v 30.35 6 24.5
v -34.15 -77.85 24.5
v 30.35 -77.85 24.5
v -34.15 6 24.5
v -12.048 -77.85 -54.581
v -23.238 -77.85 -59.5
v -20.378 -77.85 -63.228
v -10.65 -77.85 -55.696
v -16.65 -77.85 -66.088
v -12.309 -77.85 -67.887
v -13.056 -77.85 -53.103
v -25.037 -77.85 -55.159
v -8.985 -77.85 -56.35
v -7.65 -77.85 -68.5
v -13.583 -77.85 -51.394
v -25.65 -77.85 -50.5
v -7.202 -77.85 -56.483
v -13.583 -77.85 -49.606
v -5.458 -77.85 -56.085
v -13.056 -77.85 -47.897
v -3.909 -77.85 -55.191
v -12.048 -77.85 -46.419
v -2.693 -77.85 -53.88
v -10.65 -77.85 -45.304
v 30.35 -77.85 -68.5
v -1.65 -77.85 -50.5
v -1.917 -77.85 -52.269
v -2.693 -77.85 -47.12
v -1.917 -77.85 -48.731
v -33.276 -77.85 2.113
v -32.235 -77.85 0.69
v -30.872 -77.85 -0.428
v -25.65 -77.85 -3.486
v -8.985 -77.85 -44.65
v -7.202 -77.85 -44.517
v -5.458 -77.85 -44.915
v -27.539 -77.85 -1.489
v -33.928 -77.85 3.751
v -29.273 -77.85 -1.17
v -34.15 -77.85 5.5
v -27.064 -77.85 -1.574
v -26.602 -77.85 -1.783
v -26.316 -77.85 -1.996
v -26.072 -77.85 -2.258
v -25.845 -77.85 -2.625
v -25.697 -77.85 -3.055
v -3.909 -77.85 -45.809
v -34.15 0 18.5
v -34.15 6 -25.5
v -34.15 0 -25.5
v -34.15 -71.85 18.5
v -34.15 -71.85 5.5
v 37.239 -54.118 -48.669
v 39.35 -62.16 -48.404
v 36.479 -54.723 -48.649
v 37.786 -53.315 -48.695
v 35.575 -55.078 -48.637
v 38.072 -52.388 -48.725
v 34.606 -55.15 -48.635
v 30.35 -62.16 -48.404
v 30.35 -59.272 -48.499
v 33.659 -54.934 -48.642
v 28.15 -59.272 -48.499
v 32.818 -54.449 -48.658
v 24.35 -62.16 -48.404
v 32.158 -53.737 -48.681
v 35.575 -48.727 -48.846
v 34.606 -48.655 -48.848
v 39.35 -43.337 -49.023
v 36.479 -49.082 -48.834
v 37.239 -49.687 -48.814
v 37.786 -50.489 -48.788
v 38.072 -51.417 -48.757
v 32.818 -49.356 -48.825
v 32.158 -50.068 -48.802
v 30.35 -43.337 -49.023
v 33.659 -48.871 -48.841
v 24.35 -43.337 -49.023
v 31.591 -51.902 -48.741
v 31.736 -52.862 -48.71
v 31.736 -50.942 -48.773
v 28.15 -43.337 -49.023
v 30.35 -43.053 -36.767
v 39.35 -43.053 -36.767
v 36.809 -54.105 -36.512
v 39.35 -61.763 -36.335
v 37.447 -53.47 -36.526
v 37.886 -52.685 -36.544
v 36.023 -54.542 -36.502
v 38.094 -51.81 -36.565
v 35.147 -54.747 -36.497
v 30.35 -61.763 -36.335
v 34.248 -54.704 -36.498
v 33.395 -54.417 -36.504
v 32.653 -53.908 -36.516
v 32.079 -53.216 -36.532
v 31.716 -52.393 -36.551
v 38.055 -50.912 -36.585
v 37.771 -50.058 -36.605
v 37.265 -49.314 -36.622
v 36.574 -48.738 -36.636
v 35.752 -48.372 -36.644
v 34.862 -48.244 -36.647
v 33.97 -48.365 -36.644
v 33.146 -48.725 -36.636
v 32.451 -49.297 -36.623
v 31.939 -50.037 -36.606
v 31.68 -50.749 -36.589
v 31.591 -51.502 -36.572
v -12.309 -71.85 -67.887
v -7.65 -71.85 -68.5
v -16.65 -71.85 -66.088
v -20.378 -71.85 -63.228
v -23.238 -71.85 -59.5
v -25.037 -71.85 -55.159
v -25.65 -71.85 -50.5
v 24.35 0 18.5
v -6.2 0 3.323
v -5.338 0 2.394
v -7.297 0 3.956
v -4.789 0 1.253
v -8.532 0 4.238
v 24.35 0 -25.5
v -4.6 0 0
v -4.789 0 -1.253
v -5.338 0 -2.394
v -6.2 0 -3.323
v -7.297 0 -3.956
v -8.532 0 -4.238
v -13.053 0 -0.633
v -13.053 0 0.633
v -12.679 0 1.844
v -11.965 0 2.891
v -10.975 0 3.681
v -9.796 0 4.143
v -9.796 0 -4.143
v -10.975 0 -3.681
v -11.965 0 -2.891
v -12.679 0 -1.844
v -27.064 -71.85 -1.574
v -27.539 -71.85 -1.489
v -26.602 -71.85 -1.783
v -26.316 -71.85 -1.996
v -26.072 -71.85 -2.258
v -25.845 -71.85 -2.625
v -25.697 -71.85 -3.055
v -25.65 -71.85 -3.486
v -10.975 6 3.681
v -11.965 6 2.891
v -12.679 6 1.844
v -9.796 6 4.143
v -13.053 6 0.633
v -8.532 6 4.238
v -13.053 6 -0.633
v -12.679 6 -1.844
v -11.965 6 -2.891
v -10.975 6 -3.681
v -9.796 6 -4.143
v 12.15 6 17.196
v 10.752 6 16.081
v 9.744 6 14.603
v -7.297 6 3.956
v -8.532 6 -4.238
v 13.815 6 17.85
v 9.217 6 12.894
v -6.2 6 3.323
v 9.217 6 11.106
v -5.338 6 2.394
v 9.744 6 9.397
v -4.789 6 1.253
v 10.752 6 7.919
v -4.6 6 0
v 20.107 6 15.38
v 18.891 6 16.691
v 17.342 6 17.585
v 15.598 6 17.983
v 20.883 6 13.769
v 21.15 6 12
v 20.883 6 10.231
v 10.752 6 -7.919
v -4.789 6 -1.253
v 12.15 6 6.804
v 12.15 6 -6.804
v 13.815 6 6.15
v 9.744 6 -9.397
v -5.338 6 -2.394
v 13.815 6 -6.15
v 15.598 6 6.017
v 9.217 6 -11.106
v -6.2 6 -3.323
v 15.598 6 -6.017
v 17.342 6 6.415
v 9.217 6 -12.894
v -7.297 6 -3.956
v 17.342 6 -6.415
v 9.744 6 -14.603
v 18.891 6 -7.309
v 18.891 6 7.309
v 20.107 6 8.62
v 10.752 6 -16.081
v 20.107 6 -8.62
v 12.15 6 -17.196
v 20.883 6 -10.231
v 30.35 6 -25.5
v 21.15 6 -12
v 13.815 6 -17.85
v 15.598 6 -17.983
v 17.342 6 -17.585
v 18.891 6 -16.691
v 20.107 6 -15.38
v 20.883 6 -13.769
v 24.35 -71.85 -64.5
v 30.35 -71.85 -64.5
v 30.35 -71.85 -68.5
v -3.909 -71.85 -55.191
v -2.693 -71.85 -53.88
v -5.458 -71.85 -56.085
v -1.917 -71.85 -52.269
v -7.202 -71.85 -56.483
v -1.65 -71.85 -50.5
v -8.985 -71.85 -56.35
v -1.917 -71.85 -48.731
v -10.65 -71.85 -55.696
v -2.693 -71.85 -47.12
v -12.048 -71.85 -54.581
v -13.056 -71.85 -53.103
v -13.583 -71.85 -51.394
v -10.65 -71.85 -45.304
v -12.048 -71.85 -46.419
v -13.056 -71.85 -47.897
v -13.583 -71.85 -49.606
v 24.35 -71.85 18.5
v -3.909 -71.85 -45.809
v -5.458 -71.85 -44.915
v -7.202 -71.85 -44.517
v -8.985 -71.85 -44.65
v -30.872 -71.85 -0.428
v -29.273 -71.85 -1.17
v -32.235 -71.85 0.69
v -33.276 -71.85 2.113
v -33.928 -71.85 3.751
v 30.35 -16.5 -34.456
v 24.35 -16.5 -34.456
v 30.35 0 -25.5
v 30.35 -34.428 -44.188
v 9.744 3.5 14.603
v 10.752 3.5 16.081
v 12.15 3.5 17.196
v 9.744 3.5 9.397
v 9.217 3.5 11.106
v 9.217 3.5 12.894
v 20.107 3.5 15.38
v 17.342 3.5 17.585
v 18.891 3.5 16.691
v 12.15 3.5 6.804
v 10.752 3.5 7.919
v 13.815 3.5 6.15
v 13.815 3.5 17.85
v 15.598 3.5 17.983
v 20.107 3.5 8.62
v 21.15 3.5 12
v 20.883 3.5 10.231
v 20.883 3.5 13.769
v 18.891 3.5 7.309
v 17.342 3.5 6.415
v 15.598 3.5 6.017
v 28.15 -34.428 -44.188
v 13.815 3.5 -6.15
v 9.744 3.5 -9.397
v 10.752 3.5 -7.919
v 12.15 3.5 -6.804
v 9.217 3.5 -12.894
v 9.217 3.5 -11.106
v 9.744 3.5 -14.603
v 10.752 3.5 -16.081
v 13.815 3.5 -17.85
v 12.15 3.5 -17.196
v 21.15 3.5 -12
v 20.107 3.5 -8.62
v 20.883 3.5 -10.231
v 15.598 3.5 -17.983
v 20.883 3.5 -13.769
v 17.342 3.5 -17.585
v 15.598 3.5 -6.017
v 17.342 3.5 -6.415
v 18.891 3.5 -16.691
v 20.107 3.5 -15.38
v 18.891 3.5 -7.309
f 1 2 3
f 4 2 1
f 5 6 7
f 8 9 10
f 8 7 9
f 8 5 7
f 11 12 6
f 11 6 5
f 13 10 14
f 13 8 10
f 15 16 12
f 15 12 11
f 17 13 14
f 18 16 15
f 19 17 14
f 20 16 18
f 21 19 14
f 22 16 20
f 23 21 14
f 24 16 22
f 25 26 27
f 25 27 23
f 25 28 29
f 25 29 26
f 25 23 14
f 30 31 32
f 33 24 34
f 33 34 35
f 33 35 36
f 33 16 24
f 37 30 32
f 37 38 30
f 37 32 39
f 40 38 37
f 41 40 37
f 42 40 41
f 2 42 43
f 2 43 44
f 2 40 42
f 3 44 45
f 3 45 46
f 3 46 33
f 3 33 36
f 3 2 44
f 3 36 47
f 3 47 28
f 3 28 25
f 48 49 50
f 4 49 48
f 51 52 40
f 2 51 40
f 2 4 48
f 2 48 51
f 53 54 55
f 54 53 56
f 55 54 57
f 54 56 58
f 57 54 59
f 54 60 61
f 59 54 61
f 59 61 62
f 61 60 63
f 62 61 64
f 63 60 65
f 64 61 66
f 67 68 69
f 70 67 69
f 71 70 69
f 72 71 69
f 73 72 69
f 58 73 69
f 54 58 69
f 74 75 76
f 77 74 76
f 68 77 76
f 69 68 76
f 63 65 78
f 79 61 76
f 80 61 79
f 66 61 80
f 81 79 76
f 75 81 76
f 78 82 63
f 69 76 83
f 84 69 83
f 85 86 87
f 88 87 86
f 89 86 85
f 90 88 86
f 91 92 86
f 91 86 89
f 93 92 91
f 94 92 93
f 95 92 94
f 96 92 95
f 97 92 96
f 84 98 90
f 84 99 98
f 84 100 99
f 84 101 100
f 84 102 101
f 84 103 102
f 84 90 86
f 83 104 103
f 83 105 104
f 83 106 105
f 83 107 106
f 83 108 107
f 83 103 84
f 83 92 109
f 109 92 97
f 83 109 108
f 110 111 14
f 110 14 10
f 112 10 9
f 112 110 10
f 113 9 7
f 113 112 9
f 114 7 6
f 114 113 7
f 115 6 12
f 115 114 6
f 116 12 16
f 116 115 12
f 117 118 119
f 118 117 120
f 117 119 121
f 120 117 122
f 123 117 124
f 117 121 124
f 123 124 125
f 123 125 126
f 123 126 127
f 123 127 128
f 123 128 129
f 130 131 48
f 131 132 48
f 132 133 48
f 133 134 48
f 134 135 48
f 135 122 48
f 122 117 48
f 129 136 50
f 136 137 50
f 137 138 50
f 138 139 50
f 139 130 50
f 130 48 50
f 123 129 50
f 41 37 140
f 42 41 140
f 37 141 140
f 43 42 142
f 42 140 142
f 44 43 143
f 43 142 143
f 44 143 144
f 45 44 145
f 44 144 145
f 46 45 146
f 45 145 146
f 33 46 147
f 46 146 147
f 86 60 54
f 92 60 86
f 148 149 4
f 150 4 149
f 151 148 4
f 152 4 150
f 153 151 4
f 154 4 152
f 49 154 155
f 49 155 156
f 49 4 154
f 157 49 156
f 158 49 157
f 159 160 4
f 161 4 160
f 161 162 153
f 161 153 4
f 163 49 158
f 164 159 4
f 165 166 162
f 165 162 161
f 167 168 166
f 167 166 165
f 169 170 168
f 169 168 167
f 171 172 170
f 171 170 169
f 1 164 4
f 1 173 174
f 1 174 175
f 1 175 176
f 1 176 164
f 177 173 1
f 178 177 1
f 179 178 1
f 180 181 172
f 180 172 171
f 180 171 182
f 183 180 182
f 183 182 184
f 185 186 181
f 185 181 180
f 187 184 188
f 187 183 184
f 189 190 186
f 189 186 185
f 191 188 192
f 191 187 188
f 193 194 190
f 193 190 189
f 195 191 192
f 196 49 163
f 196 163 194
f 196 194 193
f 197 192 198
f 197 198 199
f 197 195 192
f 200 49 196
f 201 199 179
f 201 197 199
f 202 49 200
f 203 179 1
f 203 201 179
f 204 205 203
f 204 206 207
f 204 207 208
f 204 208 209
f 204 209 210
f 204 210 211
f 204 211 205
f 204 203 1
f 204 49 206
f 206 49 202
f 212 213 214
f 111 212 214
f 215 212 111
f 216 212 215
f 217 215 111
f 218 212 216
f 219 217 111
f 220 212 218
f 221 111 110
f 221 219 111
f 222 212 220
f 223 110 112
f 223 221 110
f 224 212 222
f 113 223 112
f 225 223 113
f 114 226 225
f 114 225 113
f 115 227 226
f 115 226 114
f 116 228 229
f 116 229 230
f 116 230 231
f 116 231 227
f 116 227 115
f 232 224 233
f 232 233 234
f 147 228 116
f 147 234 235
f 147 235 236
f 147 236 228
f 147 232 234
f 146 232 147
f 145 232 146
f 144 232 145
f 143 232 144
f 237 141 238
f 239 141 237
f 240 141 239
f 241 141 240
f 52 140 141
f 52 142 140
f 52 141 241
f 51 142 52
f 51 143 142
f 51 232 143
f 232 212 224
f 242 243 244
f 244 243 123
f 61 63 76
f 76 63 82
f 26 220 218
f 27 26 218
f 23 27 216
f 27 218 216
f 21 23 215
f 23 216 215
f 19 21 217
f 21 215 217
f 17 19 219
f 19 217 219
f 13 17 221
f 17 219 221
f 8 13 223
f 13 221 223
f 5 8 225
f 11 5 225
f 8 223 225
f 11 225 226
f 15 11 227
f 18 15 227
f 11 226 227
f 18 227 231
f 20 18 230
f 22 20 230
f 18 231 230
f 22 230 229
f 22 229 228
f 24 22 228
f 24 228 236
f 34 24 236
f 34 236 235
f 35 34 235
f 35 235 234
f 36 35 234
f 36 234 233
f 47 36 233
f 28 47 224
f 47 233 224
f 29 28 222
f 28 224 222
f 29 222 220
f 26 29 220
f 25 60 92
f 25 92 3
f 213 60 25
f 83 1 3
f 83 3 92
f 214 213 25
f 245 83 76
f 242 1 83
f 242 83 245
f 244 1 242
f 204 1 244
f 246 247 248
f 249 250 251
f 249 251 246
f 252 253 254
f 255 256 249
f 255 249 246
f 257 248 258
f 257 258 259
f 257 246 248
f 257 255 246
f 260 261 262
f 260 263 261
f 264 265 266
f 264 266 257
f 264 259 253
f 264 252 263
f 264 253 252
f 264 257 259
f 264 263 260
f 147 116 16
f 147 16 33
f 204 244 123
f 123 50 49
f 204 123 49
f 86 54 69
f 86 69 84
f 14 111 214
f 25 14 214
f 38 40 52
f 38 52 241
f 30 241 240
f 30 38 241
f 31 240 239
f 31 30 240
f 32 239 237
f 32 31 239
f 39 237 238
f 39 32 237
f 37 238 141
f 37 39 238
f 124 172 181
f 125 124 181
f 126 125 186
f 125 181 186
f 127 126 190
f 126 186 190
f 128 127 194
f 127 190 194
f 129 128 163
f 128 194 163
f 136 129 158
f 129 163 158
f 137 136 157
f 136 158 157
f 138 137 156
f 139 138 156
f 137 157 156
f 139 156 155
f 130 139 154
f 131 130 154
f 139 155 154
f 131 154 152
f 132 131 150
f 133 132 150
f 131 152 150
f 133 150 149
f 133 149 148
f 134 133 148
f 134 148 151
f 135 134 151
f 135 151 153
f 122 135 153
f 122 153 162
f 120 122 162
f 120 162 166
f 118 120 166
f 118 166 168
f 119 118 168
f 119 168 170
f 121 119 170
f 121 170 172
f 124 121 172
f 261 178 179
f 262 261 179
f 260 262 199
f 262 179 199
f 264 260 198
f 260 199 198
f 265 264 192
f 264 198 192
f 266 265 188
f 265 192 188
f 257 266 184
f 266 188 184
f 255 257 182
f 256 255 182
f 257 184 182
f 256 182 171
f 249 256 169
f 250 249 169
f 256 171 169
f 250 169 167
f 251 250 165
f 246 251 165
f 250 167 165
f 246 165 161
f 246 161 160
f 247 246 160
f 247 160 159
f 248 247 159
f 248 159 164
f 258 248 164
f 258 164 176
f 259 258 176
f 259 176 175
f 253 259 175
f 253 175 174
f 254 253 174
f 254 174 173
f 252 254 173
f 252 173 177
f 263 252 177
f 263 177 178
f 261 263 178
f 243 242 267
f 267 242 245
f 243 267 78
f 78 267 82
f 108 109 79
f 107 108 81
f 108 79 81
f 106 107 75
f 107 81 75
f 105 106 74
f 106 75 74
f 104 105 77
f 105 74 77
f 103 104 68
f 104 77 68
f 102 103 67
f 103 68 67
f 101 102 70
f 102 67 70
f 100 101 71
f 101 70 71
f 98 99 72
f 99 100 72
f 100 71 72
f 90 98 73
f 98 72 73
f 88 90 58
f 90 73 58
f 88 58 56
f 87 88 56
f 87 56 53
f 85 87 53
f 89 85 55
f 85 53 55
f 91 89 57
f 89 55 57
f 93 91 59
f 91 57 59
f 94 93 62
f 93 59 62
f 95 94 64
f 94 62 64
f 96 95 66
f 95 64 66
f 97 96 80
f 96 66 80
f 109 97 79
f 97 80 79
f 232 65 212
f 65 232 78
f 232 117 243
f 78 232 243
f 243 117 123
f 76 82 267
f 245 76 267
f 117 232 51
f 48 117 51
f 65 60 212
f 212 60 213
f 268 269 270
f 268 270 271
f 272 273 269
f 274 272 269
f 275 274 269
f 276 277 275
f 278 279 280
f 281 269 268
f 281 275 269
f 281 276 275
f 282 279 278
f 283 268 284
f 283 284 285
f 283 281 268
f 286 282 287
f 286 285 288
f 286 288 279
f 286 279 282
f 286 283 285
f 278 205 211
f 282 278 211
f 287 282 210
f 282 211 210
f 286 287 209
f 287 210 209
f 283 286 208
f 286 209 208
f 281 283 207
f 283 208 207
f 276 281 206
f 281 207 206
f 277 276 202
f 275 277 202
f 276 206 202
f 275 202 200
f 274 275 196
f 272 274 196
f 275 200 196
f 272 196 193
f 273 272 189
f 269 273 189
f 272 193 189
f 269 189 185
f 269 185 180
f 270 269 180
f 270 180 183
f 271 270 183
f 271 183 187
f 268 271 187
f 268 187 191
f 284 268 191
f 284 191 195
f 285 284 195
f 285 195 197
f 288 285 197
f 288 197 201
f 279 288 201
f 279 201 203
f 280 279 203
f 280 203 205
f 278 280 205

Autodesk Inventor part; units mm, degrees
ref_plane "YZ Plane" through (0, 0, 0) normal (1, 0, 0) x (0, 1, 0)
ref_plane "XZ Plane" through (0, 0, 0) normal (0, 1, 0) x (-1, 0, 0)
ref_plane "XY Plane" through (0, 0, 0) normal (0, 0, 1) x (1, 0, 0)
sketch "Sketch1" plane through (0, 0, 0) normal (0, 1, 0) x (-1, 0, 0)
  line L0 (0, -25.5) -> (-34.15, -25.5)
  line L1 (-34.15, -25.5) -> (-34.15, 0)
  line L2 (-34.15, 0) -> (-34.15, 25.5)
  line L3 (-34.15, 25.5) -> (0, 25.5)
  line L4 (0, 25.5) -> (34.15, 25.5)
  line L5 (34.15, 25.5) -> (34.15, 0)
  line L6 (34.15, 0) -> (34.15, -25.5)
  line L7 (34.15, -25.5) -> (0, -25.5)
  point P0 (0, 0)
extrude "Extrusion1" add sketch "Sketch1" along normal blind 7
sketch "Sketch3" plane through (-34.15, 0, 25.5) normal (0, 0, 1) x (1, 0, 0)
  line L0 (0, 0) -> (0, -78.85)
  point P0 (34.15, 0)
  dimension "d7" = 78.85
sketch "Sketch4" plane through (-34.15, 0, -25.5) normal (-1, 0, 0) x (0, 0, 1)
  line L0 (51, 0) -> (51, -78.85)
  line L1 (51, -78.85) -> (-39, -78.85)
  line L2 (-39, -78.85) -> (-39, -71.85)
  line L3 (0, 0) -> (-39, -71.85)
  line L4 (0, 0) -> (51, 0)
  point P0 (25.5, 0)
  dimension "d10" = 90
  dimension "d11" = 7
extrude "Extrusion2" add sketch "Sketch4" against normal blind 7
sketch "Sketch7" plane through (-27.15, 0, -25.5) normal (1, 0, 0) x (0, 0, -1)
  line L0 (-51, -78.85) -> (39, -78.85) projected
  line L1 (-51, -78.85) -> (39, -78.85)
  line L2 (39, -78.85) -> (39, -71.85) projected
  line L3 (39, -78.85) -> (39, -71.85)
  line L4 (39, -71.85) -> (-51, -71.85)
  line L5 (-51, 0) -> (-51, -78.85) projected
  line L6 (-51, -78.85) -> (-51, -71.85)
  point P0 (-25.5, 0)
sketch "Sketch8" plane through (0, 0, 0) normal (0, -1, 0) x (1, 0, 0)
  circle A0 centre (8.15, 0) radius 5 projected
  line L0 (8.15, 18.5) -> (34.15, 18.5)
  line L1 (34.15, 25.5) -> (34.15, -25.5) projected
  line L2 (8.15, 25.5) -> (34.15, 25.5)
  line L3 (8.15, 25.5) -> (-27.15, 25.5)
  line L4 (-27.15, 25.5) -> (-27.15, -25.5) projected
  line L5 (8.15, 18.5) -> (-27.15, 18.5)
  line L6 (34.15, 25.5) -> (34.15, 18.5)
  line L7 (-27.15, 25.5) -> (-27.15, 18.5)
  point P0 (0, 0)
extrude "Extrusion6" add sketch "Sketch7" along normal blind 58.5
extrude "Extrusion7" add sketch "Sketch8" along normal blind 78.75 contours L5 L4 L3 L2 L1 L0
sketch "Sketch9" plane through (31.35, 0, -25.5) normal (1, 0, 0) x (0, 0, -1)
  line L0 (-51, -78.75) -> (-51, 7) projected
  line L1 (-44, 0) -> (-44, -71.85) projected
  line L2 (-51, -78.75) -> (-44, -78.75)
  line L3 (-44, -78.75) -> (-44, -71.85)
  line L4 (-44, -71.85) -> (-51, -71.85)
  line L5 (-51, -71.85) -> (-51, -78.75)
  point P0 (-25.5, 0)
extrude "Extrusion8" cut sketch "Sketch9" along normal blind 10
sketch "Sketch10" plane through (0, 7, 0) normal (0, 1, 0) x (1, 0, 0)
  point P0 (0, 0)
sketch "Boceto11" plane through (-34.15, -78.85, -64.5) normal (0, -1, 0) x (1, 0, 0)
  line L0 (0, 0) -> (65.5, 0) projected
  line L1 (65.5, 89.9985) -> (65.5, 0)
  line L2 (65.5, 0) -> (71.065, 0)
  line L3 (71.065, 0) -> (71.065, 89.9985)
  line L4 (71.065, 89.9985) -> (65.5, 89.9985)
  line L5 (65.5, 89.9985) -> (65.5, 95.8996)
  line L6 (65.5, 95.8996) -> (71.065, 89.9985)
  point P0 (34.15, 64.5)
extrude "Extrusión9" cut sketch "Boceto11" against normal blind 100
sketch "Boceto12" plane through (31.35, 0, -25.5) normal (1, 0, 0) x (0, 0, -1)
  line L0 (-44, 0) -> (-44, -71.85) projected
  line L1 (-44, 0) -> (-44, -71.85)
  line L2 (39, -71.85) -> (39, -78.85) projected
  line L3 (-44, -71.85) -> (39, -71.85)
  line L4 (-44, 0) -> (0, 0) projected
  line L5 (39, -71.85) -> (0, 0)
  line L6 (0, 0) -> (-44, 0)
  point P0 (-25.5, 0)
extrude "Extrusión10" add sketch "Boceto12" against normal blind 7
sketch "Boceto13" plane through (-34.15, 7, -25.5) normal (-1, 0, 0) x (0, 0, 1)
  line L0 (0, -7) -> (0, 0) projected
  line L1 (44, -7) -> (0, -7) projected
  line L2 (0, -7) -> (44, -7)
  line L3 (44, -78.85) -> (-39, -78.85) projected
  line L4 (44, -7) -> (44, -78.85)
  line L5 (44, -78.85) -> (-39, -78.85)
  line L6 (-39, -78.85) -> (0, -7)
  point P0 (25.5, -7)
extrude "Extrusión11" cut sketch "Boceto13" against normal blind 7
sketch "Boceto15" plane through (-34.15, 0, -25.5) normal (0, 0, -1) x (-1, 0, 0)
  point P0 (-34.15, 0)
sketch "Boceto19" plane through (-34.15, -78.85, -64.5) normal (0, -1, 0) x (1, 0, 0)
  line L0 (65.5, 90) -> (65.5, 0) projected
  line L1 (65.5, 0) -> (65.5, 40.9323)
  line L2 (81.7334, 40.9323) -> (65.5, 40.9323)
  line L3 (81.7334, 40.9323) -> (81.7334, 0)
  line L4 (81.7334, 0) -> (65.5, 0)
  point P0 (34.15, 64.5)
extrude "Extrusión17" cut sketch "Boceto19" against normal blind 100
sketch "Boceto20" plane through (24.35, 0, -25.5) normal (-1, 0, 0) x (0, 0, 1)
  line L0 (-29.1839, -53.7657) -> (-27.9516, -53.3206) projected
  line L1 (0, 0) -> (-39, -71.85) projected
  line L2 (-29.1839, -53.7657) -> (-27.8697, -51.3447)
  line L3 (-27.8697, -51.3447) -> (-27.9516, -53.3206) projected
  line L4 (-27.8697, -51.3447) -> (-27.9516, -53.3206)
  line L5 (-27.9516, -53.3206) -> (-29.1839, -53.7657)
  point P0 (25.5, 0)
extrude "Extrusión18" add sketch "Boceto20" against normal blind 7
sketch "Boceto21" plane through (24.35, 0, -25.5) normal (-1, 0, 0) x (0, 0, 1)
  point P0 (25.5, 0)
sketch "Boceto22" plane through (24.35, 0, -25.5) normal (-1, 0, 0) x (0, 0, 1)
  point P0 (25.5, 0)
sketch "Boceto24" plane through (31.35, 0, -25.5) normal (1, 0, 0) x (0, 0, -1)
  point P0 (-25.5, 0)
sketch "Boceto26" plane through (24.35, 0, -25.5) normal (-1, 0, 0) x (0, 0, 1)
  point P0 (25.5, 0)
sketch "Boceto27" plane through (31.35, 0, -25.5) normal (1, 0, 0) x (0, 0, -1)
  line L0 (-51, 7) -> (0, 7) projected
  line L1 (0, 7) -> (16.0227, 7)
  line L2 (16.0227, 7) -> (16.0227, -29.5187)
  line L3 (0, 0) -> (39, -71.85) projected
  line L4 (16.0227, -29.5187) -> (0, 0)
  line L5 (0, 0) -> (0, 7)
  point P0 (-25.5, 0)
extrude "Extrusión22" add sketch "Boceto27" against normal blind 7
sketch "Boceto28" plane through (24.35, 0, -25.5) normal (-1, 0, 0) x (0, 0, 1)
  line L0 (-16.0227, -29.5187) -> (-39, -71.85) projected
  line L1 (-16.0227, -29.5187) -> (0, 0)
  line L2 (0, 7) -> (-16.0227, 7) projected
  line L3 (0, 0) -> (0, 7)
  line L4 (0, 7) -> (-16.0227, 7)
  line L5 (-16.0227, 7) -> (-16.0227, -29.5187) projected
  line L6 (-16.0227, 7) -> (-16.0227, -29.5187)
  point P0 (25.5, 0)
extrude "Extrusión23" cut sketch "Boceto28" against normal blind 7
sketch "Boceto29" plane through (31.35, 0, -25.5) normal (1, 0, 0) x (0, 0, -1)
  point P0 (-25.5, 0)
sketch "Boceto31" plane through (-34.15, -78.85, -64.5) normal (0, 0, -1) x (-1, 0, 0)
  line L0 (0, 7) -> (0, 0) projected
  line L1 (0, 0) -> (0, 1)
  line L2 (0, 1) -> (-65.5, 1)
  line L3 (-65.5, 0) -> (-65.5, 85.85) projected
  line L4 (-65.5, 1) -> (-64.5, 1)
  line L5 (-64.5, 1) -> (-64.5, 85.85)
  line L6 (0, 85.85) -> (-65.5, 85.85) projected
  line L7 (-64.5, 85.85) -> (0, 85.85)
  line L8 (0, 85.85) -> (0, 84.85)
  line L9 (0, 0) -> (0, 85.85) projected
  line L10 (0, 84.85) -> (-64.5, 84.85)
  line L11 (-64.5, 85.85) -> (-65.5, 85.85)
  line L12 (0, 0) -> (-65.5, 0) projected
  line L13 (-65.5, 85.85) -> (-65.5, 0)
  line L14 (-65.5, 0) -> (0, 0)
  point P0 (-34.15, 78.85)
  dimension "d84" = 1
  dimension "d85" = 1
  dimension "d86" = 1
extrude "Extrusión26" cut sketch "Boceto31" against normal blind 1000 contours L0 L12 L3 L2 | L10 L5 L6 L8 | L2 L3 L6 L5
sketch "Boceto32" plane through (-34.15, -71.85, 18.5) normal (-1, 0, 0) x (0, 0, 1)
  line L0 (-83, -6) -> (7, -6) projected
  line L1 (7, -6) -> (6, -6)
  line L2 (6, -6) -> (6, 77.85)
  line L3 (7, 77.85) -> (-44, 77.85) projected
  line L4 (7, -6) -> (7, 77.85) projected
  line L5 (6, 77.85) -> (7, 77.85)
  line L6 (7, 77.85) -> (7, -6)
  point P0 (-18.5, 71.85)
  dimension "d89" = 1
extrude "Extrusión27" cut sketch "Boceto32" against normal blind 100
sketch "Boceto33" plane through (-34.15, 6, -25.5) normal (0, 1, 0) x (1, 0, 0)
  line L0 (0, 0) -> (0, -44) projected
  line L1 (0, 0) -> (0, -25.5)
  line L2 (0, -25.5) -> (25.3, -25.5)
  circle A0 centre (25.3, -25.5) radius 4.25
  point P0 (34.15, -25.5)
  dimension "d92" = 25.5
  dimension "d93" = 25.3
  dimension "d94" = 8.5
extrude "Extrusión28" cut sketch "Boceto33" against normal blind 10
sketch "Boceto34" plane through (30.35, -77.85, -64.5) normal (1, 0, 0) x (0, 0, -1)
  point P0 (-64.5, 77.85)
sketch "Boceto35" plane through (30.35, -77.85, -64.5) normal (1, 0, 0) x (0, 0, -1)
  circle A0 centre (-24.4828, 41.285) radius 2.6
  point P0 (-64.5, 77.85)
  dimension "d101" = 5.2
extrude "Extrusión29" cut sketch "Boceto35" against normal blind 10
sketch "Boceto36" plane through (30.35, -77.85, -64.5) normal (1, 0, 0) x (0, 0, -1)
  point P0 (-64.5, 77.85)
sketch "Boceto37" plane through (30.35, -77.85, -64.5) normal (1, 0, 0) x (0, 0, -1)
  line L0 (-39, 77.85) -> (0, 6) projected
  line L1 (-12.3437, 28.741) -> (-12.3437, 48.1268)
  line L2 (-12.3437, 48.1268) -> (-28.4038, 58.3285)
  line L3 (-12.3437, 28.741) -> (-28.4038, 58.3285)
  point P0 (-64.5, 77.85)
extrude "Extrusión30" add sketch "Boceto37" against normal blind 6
fillet "Empalme3" radius 10 3 edges at (27.35, -29.7232, -52.1563) (27.35, -49.109, -52.1563) (27.35, -19.5215, -36.0962)
sketch "Boceto38" plane through (30.35, -77.85, -64.5) normal (1, 0, 0) x (0, 0, -1)
  point P0 (-64.5, 77.85)
sketch "Boceto39" plane through (30.35, -77.85, -64.5) normal (1, 0, 0) x (0, 0, -1)
  line L0 (-6.8274, 18.5782) -> (-18.8698, 18.5782)
  line L1 (-18.8698, 18.5782) -> (-18.2969, 35.7502)
  line L2 (-18.2969, 35.7502) -> (-20.685, 39.2299)
  line L3 (-20.685, 39.2299) -> (-19.4909, 52.6668)
  line L4 (-26.2143, 56.9377) -> (-16.9818, 51.073) projected
  line L5 (-6.8274, 18.5782) -> (-5.5662, 48.0514)
  line L6 (-5.5662, 48.0514) -> (-19.4909, 52.6668)
  point P0 (-64.5, 77.85)
extrude "Extrusión31" cut sketch "Boceto39" against normal blind 2.2
fillet "Empalme4" radius 10 1 edges at (29.25, -25.1832, -45.0091)
sketch "Boceto40" plane through (24.35, 0, -25.5) normal (-1, 0, 0) x (0, 0, 1)
  line L0 (-26.6563, -35.218) -> (-26.6563, -46.57) projected
  line L1 (-26.6563, -35.218) -> (-24.0221, -30.4862) construction
  arc A0 (-12.7857, -20.9123) -> (-9.3588, -17.2419) centre (-18.1476, -12.4713) ccw projected
  line L2 (-24.0221, -30.4862) -> (-10.7107, -19.1566) construction
  spline S0 degree 2 poles (-26.6563, -35.218) (-24.0221, -30.4862) (-10.7107, -19.1566) knots 1 1 1 2 2 2
  line L3 (-26.6563, -35.218) -> (-10.7107, -35.218)
  line L4 (-10.7107, -35.218) -> (-10.7107, -19.1566)
  line L5 (-10.7107, -19.1566) -> (-26.6563, -19.1566)
  line L6 (-26.6563, -19.1566) -> (-26.6563, -35.218)
  point P0 (25.5, 0)
  point P1 (-10.7107, -19.1566)
extrude "Extrusión32" cut sketch "Boceto40" against normal blind 6 contours S0 L6 L5
fillet "Empalme5" radius 10 1 edges at (26.25, -35.218, -52.1563)
sketch "Boceto41" plane through (-34.15, -71.85, 18.5) normal (0, 1, 0) x (1, 0, 0)
  circle A0 centre (11.5, 71.5) radius 5 projected
  circle A1 centre (11.5, 71.5) radius 6
  line L0 (11.5, 71.5) -> (-12.5, 71.5)
  line L1 (-12.5, 71.5) -> (-12.5, 95.5)
  line L2 (-12.5, 95.5) -> (11.5, 95.5)
  line L3 (11.5, 95.5) -> (11.5, 71.5)
  line L4 (64.5, 76.1726) -> (64.5, 83) projected
  line L5 (64.5, 83) -> (64.5, 95.5)
  line L6 (64.5, 95.5) -> (11.5, 95.5)
  line L7 (0, 83) -> (0, -6) projected
  line L8 (0, -6) -> (-12.5, -6)
  line L9 (-12.5, -6) -> (-12.5, 71.5)
  line L10 (64.5, 83) -> (11.5, 83)
  line L11 (0, 83) -> (58.5, 83) projected
  point P0 (34.15, 18.5)
  dimension "d113" = 12
  dimension "d114" = 24
  dimension "d115" = 24
extrude "Extrusión33" add sketch "Boceto41" against normal blind 6 contours L11 L7 L0 L1 L2 L3 | L3 L6 L5 L10 | L7 L8 L9 L0
sketch "Boceto43" plane through (30.35, 6, 24.5) normal (0, 1, 0) x (1, 0, 0)
  circle A0 centre (-39.2, 24.5) radius 4.25 projected
  line L0 (-39.2, 24.5) -> (-15.2, 24.5)
  line L1 (-15.2, 24.5) -> (-15.2, 12.5)
  line L2 (-15.2, 12.5) -> (-15.2, 36.5)
  circle A1 centre (-15.2, 36.5) radius 6
  circle A2 centre (-15.2, 12.5) radius 6
  point P0 (-30.35, 24.5)
  dimension "d123" = 24
  dimension "d124" = 12
  dimension "d125" = 24
  dimension "d126" = 12
  dimension "d127" = 12
extrude "Extrusión35" cut sketch "Boceto43" against normal blind 2.5 contours A1 | A2
sketch "Boceto44" plane through (24.35, 0, -25.5) normal (-1, 0, 0) x (0, 0, 1)
  line L0 (0, 0) -> (-9.3588, -17.2419) projected
  line L1 (-9.3588, -17.2419) -> (-30.5215, -33.5874)
  line L2 (-30.5215, -33.5874) -> (-30.5215, -56.2301)
  line L3 (-27.8675, -51.3405) -> (-39, -71.85) projected
  arc A0 (-12.666, -20.8351) -> (-9.3588, -17.2419) centre (-18.1476, -12.4713) ccw projected
  line L4 (-30.5215, -56.2301) -> (-9.3588, -17.2419)
  point P0 (25.5, 0)
extrude "Extrusión36" add sketch "Boceto44" against normal blind 6
sketch "Boceto45" plane through (30.35, 0, -25.5) normal (1, 0, 0) x (0, 0, -1)
  line L0 (18.315, -38.6201) -> (18.6875, -34.4282) projected
  line L1 (18.6875, -34.4282) -> (19.9402, -25.4146)
  line L2 (9.3588, -17.2419) -> (30.5215, -33.5874) projected
  line L3 (30.5215, -56.2301) -> (30.5215, -33.5874) projected
  line L4 (19.9402, -25.4146) -> (30.5215, -33.5874)
  line L5 (30.5215, -33.5874) -> (32.1519, -59.2336)
  line L6 (30.5215, -56.2301) -> (39, -71.85) projected
  line L7 (32.1726, -59.2718) -> (20.1302, -59.2718) projected
  line L8 (32.1726, -59.2718) -> (18.315, -38.6201)
  point P0 (-25.5, 0)
extrude "Extrusión37" cut sketch "Boceto45" against normal blind 2.2 contours L0 L1 L2 L3 L6 L8
fillet "Empalme7" radius 4 3 edges at (26.25, -33.5874, -56.0215) (27.35, -17.2419, -34.8588) (26.25, -56.2301, -56.0215)
sketch "Boceto46" plane through (-34.15, -71.85, 18.5) normal (0, 1, 0) x (1, 0, 0)
  line L0 (-12.5, -6) -> (0, -6) projected
  line L1 (0, -6) -> (0, 95.5)
  line L2 (-12.5, 95.5) -> (64.5, 95.5) projected
  line L3 (0, 95.5) -> (-12.5, 95.5)
  line L4 (-12.5, 95.5) -> (-12.5, -6)
  line L5 (-12.5, -6) -> (0, -6)
  point P0 (34.15, 18.5)
extrude "Extrusión38" cut sketch "Boceto46" against normal blind 10
sketch "Boceto47" plane through (-34.15, -71.85, 18.5) normal (0, 1, 0) x (1, 0, 0)
  line L0 (0, 0) -> (0, -6) projected
  line L1 (0, 95.5) -> (26.5, 95.5)
  line L2 (26.5, 95.5) -> (26.5, 69)
  line L3 (26.5, 69) -> (0, 69)
  line L4 (0, 69) -> (0, 95.5)
  circle A0 centre (26.5, 69) radius 6
  point P0 (34.15, 18.5)
  dimension "d137" = 26.5
  dimension "d138" = 26.5
  dimension "d139" = 12
extrude "Extrusión39" cut sketch "Boceto47" against normal blind 10 contours A0 L3 L2 | L2 L3 A0
sketch "Sketch48" plane through (-34.15, -71.85, 18.5) normal (0, 1, 0) x (1, 0, 0)
  circle A0 centre (26.5, 69) radius 6 projected
  line L0 (29.7126, 74.0675) -> (26.5, 69)
  circle A1 centre (26.5, 69) radius 18
  line L1 (8.5, 69) -> (8.5, 0)
  line L2 (0, 0) -> (58.5, 0) projected
  line L3 (0, 0) -> (8.5, 0)
  line L4 (26.5, 87) -> (64.5, 87)
  line L5 (64.5, 83) -> (64.5, 95.5) projected
  line L6 (0, 0) -> (0, 95.5) projected
  line L7 (64.5, 95.5) -> (0, 95.5)
  line L8 (0, 95.5) -> (0, 0)
  point P0 (34.15, 18.5)
  dimension "d142" = 36
extrude "Extrusion40" cut sketch "Sketch48" against normal blind 10 contours A1 L1 L2 L6 L7 L5 L4
sketch "Sketch49" plane through (24.35, 0, 18.5) normal (0, 0, -1) x (-1, 0, 0)
  line L0 (58.5, -77.85) -> (50, -77.85) projected
  line L1 (58.5, -77.85) -> (50, -77.85)
  line L2 (50, -71.85) -> (0, -71.85) projected
  line L3 (50, -77.85) -> (50, -71.85)
  line L4 (50, -71.85) -> (58.5, -71.85)
  line L5 (58.5, -71.85) -> (58.5, -77.85)
  point P0 (24.35, 0)
extrude "Extrusion41" add sketch "Sketch49" along normal blind 20
fillet "Fillet8" radius 7 1 edges at (-34.15, -74.85, -1.5)
fillet "Fillet9" radius 2 1 edges at (-25.65, -74.85, -1.5)
sketch "Sketch50" plane through (28.15, -77.85, -64.5) normal (1, 0, 0) x (0, 0, -1)
  point P0 (-64.5, 77.85)
sketch "Sketch51" plane through (-34.15, -77.85, 24.5) normal (0, -1, 0) x (1, 0, 0)
  line L0 (64.5, -50) -> (64.5, 0) projected
  line L1 (64.5, 0) -> (-39.5, 0)
  line L2 (-39.5, 0) -> (-39.5, -120)
  line L3 (-39.5, -120) -> (64.5, -120)
  line L4 (64.5, -120) -> (64.5, 0)
  point P0 (34.15, -24.5)
  dimension "d149" = 104
  dimension "d150" = 120
sketch "Sketch52" plane through (30.35, 0, -25.5) normal (1, 0, 0) x (0, 0, -1)
  line L0 (0, 0) -> (-44, 0) projected
  line L1 (32.1726, -59.2718) -> (39, -71.85) projected
  line L2 (0, 0) -> (39, -71.85)
  line L3 (22.9041, -62.1597) -> (23.523, -43.3366)
  line L4 (22.9041, -62.1597) -> (39, -71.85)
  line L5 (39, -71.85) -> (32.1726, -12.8018)
  line L6 (0, 0) -> (0, 6) projected
  line L7 (32.1726, -12.8018) -> (0, 0)
  point P0 (-25.5, 0)
extrude "Extrusion42" cut sketch "Sketch52" against normal blind 10
sketch "Sketch53" plane through (28.15, -77.85, -64.5) normal (1, 0, 0) x (0, 0, -1)
  line L0 (-16.0959, 15.6903) -> (0, 6) projected
  line L1 (-16.001, 18.5782) -> (-15.477, 34.5134) projected
  line L2 (-16.0959, 15.6903) -> (-15.477, 34.5134)
  line L3 (-15.477, 34.5134) -> (-20.7531, 44.2336)
  line L4 (-39, 77.85) -> (-15.477, 34.5134) projected
  line L5 (-20.7531, 44.2336) -> (-21.8828, 18.4708)
  line L6 (-21.8828, 18.4708) -> (-16.0045, 18.4708)
  point P0 (-64.5, 77.85)
extrude "Extrusion43" add sketch "Sketch53" along normal blind 2.2
sketch "Sketch54" plane through (30.35, 0, -25.5) normal (1, 0, 0) x (0, 0, -1)
  circle A0 centre (14.5172, -36.565) radius 2.6 projected
  circle A1 centre (14.5172, -36.565) radius 2.6
  point P0 (-25.5, 0)
extrude "Extrusion44" add sketch "Sketch54" against normal blind 6
sketch "Sketch55" plane through (30.35, 0, -25.5) normal (1, 0, 0) x (0, 0, -1)
  line L0 (39, -71.85) -> (22.9041, -62.1597) projected
  line L1 (22.9041, -62.1597) -> (13.9423, -61.864)
  line L2 (22.9041, -62.1597) -> (23.523, -43.3366) projected
  line L3 (19.528, -36.1291) -> (23.523, -43.3366)
  line L4 (22.9041, -62.1597) -> (23.523, -43.3366)
  line L5 (5.6191, -42.216) -> (13.9423, -61.864)
  line L6 (5.6191, -42.216) -> (19.528, -36.1291)
  point P0 (-25.5, 0)
sketch "Sketch56" plane through (24.35, 0, -25.5) normal (-1, 0, 0) x (0, 0, 1)
  line L0 (-22.9041, -62.1597) -> (-23.523, -43.3366) projected
  line L1 (-23.523, -43.3366) -> (-22.9041, -62.1597)
  line L2 (-22.9041, -62.1597) -> (-10.8346, -61.7628)
  line L3 (-10.8346, -61.7628) -> (-11.7615, -21.6683)
  line L4 (0, 0) -> (-23.523, -43.3366) projected
  line L5 (-23.523, -43.3366) -> (-11.2671, -43.0533)
  line L6 (-23.523, -43.3366) -> (-22.9041, -62.1597)
  line L7 (-22.9041, -62.1597) -> (-10.8346, -61.7628)
  line L8 (-10.8346, -61.7628) -> (-11.2671, -43.0533)
  line L9 (-11.2671, -43.0533) -> (-23.523, -43.3366)
  point P0 (25.5, 0)
extrude "Extrusion45" add sketch "Sketch56" against normal blind 15 contours L0 L5 L3 L2
sketch "Sketch57" plane through (39.35, -43.3366, -49.023) normal (0, -0.0328631, -0.9994599) x (-1, 0, 0)
  line L0 (0, -18.8333) -> (0, 0) projected
  line L1 (0, -8.5704) -> (9, -8.5704)
  line L2 (9, 46.8938) -> (9, -36.911) projected
  circle A0 centre (4.5, -8.5704) radius 3.2586
  point P0 (39.35, 41.7021)
extrude "Extrusion46" cut sketch "Sketch57" against normal blind 15
properties part number "AC23[i3][L]" material "Aluminio 6061"
